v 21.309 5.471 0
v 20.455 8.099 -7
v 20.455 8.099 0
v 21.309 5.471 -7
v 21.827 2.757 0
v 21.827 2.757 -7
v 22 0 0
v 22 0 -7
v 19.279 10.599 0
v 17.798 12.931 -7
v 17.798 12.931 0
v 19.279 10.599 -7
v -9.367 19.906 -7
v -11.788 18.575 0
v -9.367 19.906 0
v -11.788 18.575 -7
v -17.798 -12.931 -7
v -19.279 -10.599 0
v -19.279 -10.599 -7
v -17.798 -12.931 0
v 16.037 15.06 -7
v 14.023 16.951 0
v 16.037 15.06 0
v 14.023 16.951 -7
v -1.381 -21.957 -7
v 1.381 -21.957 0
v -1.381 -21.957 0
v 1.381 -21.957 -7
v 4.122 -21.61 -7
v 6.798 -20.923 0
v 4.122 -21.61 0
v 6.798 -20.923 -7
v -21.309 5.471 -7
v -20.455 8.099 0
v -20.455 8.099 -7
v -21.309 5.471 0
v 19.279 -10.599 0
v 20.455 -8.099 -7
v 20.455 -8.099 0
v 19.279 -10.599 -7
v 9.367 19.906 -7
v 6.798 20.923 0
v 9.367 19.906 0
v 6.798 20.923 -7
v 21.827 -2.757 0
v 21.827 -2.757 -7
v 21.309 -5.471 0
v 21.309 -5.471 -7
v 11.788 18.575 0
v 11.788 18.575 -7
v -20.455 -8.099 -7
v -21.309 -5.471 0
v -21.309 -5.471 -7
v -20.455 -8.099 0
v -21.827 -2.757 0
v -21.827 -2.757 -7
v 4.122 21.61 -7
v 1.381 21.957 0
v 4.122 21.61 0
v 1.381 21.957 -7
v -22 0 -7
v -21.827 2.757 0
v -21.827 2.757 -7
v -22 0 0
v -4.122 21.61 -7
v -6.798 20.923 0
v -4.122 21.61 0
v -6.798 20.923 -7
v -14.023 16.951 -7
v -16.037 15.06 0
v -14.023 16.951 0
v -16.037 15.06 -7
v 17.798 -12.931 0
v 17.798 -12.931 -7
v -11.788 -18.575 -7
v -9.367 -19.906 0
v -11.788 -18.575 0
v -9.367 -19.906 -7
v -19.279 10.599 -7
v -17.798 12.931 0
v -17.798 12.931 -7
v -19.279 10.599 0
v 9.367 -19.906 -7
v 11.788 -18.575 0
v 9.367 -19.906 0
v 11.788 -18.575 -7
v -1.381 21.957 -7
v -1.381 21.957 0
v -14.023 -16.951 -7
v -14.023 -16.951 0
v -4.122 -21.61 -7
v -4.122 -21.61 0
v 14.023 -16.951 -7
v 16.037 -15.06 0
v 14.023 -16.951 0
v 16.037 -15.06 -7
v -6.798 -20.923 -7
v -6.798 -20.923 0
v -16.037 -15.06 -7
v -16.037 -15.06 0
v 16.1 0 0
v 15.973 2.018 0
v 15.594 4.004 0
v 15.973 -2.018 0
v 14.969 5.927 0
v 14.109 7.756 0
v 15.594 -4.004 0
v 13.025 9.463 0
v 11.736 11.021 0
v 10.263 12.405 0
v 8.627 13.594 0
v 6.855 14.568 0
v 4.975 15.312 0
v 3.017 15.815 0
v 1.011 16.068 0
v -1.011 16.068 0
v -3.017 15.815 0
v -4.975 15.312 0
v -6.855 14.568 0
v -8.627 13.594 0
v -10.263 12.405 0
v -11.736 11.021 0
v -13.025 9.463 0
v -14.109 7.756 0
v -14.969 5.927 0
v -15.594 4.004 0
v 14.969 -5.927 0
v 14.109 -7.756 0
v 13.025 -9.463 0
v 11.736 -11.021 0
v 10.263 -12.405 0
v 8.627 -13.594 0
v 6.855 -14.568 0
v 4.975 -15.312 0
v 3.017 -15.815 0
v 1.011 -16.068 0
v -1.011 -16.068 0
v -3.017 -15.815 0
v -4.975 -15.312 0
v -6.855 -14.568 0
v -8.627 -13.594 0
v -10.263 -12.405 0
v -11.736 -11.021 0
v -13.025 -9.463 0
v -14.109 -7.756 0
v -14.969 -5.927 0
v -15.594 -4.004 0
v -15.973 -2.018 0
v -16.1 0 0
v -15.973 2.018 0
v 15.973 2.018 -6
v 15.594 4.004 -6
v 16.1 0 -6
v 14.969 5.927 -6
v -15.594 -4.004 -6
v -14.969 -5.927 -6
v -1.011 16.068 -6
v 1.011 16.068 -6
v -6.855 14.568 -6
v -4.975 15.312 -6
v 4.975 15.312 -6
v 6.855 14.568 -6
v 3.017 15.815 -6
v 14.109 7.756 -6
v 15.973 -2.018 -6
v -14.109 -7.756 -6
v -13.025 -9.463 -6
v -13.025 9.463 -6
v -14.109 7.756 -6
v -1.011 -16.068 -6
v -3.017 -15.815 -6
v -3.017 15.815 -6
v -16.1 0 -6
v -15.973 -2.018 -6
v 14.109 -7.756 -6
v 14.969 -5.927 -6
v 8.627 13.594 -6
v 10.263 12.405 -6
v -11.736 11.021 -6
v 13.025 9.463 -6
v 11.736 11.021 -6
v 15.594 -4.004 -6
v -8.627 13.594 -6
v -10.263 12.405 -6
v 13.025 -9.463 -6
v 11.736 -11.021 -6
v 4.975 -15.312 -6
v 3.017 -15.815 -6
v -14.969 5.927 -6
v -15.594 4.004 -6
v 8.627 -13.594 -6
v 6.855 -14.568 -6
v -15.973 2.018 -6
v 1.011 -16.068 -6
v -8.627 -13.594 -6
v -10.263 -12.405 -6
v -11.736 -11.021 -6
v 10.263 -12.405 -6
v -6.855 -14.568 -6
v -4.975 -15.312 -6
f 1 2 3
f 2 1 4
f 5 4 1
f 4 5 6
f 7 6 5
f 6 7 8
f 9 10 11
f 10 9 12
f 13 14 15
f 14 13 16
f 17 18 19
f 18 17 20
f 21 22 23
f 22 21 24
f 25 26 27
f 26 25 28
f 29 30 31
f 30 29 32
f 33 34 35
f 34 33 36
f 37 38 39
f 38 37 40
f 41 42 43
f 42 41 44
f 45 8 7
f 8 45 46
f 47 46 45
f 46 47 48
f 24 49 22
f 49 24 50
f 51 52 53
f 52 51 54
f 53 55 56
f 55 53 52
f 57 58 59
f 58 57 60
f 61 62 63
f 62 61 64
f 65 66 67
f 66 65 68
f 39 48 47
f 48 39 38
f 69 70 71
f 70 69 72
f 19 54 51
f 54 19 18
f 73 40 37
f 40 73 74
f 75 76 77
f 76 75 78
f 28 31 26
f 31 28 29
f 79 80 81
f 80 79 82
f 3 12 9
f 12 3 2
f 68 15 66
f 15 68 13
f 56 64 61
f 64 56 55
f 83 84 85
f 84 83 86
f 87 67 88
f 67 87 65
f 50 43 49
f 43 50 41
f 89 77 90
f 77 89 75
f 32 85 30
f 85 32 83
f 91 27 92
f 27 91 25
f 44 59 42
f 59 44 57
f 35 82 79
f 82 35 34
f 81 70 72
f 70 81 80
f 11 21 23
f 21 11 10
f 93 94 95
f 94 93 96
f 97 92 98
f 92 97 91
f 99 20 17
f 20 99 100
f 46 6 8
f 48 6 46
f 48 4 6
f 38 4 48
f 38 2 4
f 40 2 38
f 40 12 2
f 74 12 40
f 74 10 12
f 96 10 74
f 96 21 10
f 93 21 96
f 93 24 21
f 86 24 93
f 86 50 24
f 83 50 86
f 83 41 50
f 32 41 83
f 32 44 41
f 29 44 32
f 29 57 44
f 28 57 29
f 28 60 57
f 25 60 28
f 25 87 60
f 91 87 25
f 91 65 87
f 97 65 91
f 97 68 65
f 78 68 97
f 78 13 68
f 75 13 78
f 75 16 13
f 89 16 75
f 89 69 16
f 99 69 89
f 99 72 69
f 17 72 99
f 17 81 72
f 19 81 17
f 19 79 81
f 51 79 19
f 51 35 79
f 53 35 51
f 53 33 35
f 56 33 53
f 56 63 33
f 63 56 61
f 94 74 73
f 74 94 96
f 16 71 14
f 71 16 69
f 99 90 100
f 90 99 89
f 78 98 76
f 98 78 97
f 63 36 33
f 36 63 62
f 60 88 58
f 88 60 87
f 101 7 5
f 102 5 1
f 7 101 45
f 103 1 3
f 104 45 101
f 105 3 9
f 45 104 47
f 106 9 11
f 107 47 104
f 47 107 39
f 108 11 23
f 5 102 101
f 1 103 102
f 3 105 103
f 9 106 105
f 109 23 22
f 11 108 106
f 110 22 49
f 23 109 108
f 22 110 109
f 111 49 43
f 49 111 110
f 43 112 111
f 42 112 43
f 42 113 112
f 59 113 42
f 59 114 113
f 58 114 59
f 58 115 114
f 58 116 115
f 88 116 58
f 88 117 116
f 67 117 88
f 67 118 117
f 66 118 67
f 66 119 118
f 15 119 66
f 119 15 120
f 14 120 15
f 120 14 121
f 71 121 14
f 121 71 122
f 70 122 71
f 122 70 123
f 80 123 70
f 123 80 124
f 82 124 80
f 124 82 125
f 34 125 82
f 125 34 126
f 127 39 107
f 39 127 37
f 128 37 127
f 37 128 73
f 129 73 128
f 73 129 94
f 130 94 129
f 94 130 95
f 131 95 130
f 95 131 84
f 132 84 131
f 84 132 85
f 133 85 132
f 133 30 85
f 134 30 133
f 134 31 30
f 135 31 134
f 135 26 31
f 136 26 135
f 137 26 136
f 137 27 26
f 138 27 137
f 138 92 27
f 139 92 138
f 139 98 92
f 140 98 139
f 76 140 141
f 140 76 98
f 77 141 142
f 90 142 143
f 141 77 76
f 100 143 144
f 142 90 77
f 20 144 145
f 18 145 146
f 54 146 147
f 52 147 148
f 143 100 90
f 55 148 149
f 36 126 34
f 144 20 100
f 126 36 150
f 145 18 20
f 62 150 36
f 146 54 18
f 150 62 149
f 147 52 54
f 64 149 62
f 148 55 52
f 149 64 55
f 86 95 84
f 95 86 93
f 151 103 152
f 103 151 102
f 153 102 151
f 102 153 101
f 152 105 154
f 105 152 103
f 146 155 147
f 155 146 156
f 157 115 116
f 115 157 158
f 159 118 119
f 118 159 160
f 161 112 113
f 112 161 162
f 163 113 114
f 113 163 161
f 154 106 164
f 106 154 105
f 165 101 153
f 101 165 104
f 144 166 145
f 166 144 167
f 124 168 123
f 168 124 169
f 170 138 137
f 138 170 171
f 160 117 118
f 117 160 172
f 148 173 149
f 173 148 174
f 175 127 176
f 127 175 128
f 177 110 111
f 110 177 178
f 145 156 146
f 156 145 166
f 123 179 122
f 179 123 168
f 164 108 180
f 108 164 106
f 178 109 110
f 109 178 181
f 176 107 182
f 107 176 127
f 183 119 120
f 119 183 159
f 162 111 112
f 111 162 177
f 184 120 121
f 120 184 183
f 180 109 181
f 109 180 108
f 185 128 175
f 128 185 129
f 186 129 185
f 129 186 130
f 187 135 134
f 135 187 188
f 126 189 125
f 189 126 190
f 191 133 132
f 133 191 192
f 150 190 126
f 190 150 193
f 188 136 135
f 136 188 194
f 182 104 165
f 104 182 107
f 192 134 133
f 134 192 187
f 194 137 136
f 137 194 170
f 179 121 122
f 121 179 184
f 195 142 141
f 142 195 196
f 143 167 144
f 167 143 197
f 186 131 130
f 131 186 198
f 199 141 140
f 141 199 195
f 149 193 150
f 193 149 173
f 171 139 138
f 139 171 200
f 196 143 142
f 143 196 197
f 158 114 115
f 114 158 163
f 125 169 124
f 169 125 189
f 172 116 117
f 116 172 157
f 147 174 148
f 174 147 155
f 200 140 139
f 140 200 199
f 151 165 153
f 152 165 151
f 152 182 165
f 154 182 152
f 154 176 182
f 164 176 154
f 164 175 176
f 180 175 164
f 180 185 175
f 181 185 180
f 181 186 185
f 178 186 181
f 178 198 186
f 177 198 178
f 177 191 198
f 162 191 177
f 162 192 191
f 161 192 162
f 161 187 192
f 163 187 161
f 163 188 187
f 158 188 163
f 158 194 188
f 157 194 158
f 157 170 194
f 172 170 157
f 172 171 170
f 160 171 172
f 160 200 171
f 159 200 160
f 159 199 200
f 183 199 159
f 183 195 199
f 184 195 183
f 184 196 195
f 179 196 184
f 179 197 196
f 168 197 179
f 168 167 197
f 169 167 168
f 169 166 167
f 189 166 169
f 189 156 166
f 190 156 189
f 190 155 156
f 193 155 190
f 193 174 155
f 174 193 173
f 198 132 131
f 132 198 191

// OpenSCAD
$fn = 50;


difference() {
	union() {
		translate(v = [0, 0, -7.0000000000]) {
			cylinder(h = 7, r = 22.0000000000);
		}
	}
	union() {
		#translate(v = [0, 0, -6.0000000000]) {
			cylinder(h = 6, r = 16.1000000000);
		}
	}
}
